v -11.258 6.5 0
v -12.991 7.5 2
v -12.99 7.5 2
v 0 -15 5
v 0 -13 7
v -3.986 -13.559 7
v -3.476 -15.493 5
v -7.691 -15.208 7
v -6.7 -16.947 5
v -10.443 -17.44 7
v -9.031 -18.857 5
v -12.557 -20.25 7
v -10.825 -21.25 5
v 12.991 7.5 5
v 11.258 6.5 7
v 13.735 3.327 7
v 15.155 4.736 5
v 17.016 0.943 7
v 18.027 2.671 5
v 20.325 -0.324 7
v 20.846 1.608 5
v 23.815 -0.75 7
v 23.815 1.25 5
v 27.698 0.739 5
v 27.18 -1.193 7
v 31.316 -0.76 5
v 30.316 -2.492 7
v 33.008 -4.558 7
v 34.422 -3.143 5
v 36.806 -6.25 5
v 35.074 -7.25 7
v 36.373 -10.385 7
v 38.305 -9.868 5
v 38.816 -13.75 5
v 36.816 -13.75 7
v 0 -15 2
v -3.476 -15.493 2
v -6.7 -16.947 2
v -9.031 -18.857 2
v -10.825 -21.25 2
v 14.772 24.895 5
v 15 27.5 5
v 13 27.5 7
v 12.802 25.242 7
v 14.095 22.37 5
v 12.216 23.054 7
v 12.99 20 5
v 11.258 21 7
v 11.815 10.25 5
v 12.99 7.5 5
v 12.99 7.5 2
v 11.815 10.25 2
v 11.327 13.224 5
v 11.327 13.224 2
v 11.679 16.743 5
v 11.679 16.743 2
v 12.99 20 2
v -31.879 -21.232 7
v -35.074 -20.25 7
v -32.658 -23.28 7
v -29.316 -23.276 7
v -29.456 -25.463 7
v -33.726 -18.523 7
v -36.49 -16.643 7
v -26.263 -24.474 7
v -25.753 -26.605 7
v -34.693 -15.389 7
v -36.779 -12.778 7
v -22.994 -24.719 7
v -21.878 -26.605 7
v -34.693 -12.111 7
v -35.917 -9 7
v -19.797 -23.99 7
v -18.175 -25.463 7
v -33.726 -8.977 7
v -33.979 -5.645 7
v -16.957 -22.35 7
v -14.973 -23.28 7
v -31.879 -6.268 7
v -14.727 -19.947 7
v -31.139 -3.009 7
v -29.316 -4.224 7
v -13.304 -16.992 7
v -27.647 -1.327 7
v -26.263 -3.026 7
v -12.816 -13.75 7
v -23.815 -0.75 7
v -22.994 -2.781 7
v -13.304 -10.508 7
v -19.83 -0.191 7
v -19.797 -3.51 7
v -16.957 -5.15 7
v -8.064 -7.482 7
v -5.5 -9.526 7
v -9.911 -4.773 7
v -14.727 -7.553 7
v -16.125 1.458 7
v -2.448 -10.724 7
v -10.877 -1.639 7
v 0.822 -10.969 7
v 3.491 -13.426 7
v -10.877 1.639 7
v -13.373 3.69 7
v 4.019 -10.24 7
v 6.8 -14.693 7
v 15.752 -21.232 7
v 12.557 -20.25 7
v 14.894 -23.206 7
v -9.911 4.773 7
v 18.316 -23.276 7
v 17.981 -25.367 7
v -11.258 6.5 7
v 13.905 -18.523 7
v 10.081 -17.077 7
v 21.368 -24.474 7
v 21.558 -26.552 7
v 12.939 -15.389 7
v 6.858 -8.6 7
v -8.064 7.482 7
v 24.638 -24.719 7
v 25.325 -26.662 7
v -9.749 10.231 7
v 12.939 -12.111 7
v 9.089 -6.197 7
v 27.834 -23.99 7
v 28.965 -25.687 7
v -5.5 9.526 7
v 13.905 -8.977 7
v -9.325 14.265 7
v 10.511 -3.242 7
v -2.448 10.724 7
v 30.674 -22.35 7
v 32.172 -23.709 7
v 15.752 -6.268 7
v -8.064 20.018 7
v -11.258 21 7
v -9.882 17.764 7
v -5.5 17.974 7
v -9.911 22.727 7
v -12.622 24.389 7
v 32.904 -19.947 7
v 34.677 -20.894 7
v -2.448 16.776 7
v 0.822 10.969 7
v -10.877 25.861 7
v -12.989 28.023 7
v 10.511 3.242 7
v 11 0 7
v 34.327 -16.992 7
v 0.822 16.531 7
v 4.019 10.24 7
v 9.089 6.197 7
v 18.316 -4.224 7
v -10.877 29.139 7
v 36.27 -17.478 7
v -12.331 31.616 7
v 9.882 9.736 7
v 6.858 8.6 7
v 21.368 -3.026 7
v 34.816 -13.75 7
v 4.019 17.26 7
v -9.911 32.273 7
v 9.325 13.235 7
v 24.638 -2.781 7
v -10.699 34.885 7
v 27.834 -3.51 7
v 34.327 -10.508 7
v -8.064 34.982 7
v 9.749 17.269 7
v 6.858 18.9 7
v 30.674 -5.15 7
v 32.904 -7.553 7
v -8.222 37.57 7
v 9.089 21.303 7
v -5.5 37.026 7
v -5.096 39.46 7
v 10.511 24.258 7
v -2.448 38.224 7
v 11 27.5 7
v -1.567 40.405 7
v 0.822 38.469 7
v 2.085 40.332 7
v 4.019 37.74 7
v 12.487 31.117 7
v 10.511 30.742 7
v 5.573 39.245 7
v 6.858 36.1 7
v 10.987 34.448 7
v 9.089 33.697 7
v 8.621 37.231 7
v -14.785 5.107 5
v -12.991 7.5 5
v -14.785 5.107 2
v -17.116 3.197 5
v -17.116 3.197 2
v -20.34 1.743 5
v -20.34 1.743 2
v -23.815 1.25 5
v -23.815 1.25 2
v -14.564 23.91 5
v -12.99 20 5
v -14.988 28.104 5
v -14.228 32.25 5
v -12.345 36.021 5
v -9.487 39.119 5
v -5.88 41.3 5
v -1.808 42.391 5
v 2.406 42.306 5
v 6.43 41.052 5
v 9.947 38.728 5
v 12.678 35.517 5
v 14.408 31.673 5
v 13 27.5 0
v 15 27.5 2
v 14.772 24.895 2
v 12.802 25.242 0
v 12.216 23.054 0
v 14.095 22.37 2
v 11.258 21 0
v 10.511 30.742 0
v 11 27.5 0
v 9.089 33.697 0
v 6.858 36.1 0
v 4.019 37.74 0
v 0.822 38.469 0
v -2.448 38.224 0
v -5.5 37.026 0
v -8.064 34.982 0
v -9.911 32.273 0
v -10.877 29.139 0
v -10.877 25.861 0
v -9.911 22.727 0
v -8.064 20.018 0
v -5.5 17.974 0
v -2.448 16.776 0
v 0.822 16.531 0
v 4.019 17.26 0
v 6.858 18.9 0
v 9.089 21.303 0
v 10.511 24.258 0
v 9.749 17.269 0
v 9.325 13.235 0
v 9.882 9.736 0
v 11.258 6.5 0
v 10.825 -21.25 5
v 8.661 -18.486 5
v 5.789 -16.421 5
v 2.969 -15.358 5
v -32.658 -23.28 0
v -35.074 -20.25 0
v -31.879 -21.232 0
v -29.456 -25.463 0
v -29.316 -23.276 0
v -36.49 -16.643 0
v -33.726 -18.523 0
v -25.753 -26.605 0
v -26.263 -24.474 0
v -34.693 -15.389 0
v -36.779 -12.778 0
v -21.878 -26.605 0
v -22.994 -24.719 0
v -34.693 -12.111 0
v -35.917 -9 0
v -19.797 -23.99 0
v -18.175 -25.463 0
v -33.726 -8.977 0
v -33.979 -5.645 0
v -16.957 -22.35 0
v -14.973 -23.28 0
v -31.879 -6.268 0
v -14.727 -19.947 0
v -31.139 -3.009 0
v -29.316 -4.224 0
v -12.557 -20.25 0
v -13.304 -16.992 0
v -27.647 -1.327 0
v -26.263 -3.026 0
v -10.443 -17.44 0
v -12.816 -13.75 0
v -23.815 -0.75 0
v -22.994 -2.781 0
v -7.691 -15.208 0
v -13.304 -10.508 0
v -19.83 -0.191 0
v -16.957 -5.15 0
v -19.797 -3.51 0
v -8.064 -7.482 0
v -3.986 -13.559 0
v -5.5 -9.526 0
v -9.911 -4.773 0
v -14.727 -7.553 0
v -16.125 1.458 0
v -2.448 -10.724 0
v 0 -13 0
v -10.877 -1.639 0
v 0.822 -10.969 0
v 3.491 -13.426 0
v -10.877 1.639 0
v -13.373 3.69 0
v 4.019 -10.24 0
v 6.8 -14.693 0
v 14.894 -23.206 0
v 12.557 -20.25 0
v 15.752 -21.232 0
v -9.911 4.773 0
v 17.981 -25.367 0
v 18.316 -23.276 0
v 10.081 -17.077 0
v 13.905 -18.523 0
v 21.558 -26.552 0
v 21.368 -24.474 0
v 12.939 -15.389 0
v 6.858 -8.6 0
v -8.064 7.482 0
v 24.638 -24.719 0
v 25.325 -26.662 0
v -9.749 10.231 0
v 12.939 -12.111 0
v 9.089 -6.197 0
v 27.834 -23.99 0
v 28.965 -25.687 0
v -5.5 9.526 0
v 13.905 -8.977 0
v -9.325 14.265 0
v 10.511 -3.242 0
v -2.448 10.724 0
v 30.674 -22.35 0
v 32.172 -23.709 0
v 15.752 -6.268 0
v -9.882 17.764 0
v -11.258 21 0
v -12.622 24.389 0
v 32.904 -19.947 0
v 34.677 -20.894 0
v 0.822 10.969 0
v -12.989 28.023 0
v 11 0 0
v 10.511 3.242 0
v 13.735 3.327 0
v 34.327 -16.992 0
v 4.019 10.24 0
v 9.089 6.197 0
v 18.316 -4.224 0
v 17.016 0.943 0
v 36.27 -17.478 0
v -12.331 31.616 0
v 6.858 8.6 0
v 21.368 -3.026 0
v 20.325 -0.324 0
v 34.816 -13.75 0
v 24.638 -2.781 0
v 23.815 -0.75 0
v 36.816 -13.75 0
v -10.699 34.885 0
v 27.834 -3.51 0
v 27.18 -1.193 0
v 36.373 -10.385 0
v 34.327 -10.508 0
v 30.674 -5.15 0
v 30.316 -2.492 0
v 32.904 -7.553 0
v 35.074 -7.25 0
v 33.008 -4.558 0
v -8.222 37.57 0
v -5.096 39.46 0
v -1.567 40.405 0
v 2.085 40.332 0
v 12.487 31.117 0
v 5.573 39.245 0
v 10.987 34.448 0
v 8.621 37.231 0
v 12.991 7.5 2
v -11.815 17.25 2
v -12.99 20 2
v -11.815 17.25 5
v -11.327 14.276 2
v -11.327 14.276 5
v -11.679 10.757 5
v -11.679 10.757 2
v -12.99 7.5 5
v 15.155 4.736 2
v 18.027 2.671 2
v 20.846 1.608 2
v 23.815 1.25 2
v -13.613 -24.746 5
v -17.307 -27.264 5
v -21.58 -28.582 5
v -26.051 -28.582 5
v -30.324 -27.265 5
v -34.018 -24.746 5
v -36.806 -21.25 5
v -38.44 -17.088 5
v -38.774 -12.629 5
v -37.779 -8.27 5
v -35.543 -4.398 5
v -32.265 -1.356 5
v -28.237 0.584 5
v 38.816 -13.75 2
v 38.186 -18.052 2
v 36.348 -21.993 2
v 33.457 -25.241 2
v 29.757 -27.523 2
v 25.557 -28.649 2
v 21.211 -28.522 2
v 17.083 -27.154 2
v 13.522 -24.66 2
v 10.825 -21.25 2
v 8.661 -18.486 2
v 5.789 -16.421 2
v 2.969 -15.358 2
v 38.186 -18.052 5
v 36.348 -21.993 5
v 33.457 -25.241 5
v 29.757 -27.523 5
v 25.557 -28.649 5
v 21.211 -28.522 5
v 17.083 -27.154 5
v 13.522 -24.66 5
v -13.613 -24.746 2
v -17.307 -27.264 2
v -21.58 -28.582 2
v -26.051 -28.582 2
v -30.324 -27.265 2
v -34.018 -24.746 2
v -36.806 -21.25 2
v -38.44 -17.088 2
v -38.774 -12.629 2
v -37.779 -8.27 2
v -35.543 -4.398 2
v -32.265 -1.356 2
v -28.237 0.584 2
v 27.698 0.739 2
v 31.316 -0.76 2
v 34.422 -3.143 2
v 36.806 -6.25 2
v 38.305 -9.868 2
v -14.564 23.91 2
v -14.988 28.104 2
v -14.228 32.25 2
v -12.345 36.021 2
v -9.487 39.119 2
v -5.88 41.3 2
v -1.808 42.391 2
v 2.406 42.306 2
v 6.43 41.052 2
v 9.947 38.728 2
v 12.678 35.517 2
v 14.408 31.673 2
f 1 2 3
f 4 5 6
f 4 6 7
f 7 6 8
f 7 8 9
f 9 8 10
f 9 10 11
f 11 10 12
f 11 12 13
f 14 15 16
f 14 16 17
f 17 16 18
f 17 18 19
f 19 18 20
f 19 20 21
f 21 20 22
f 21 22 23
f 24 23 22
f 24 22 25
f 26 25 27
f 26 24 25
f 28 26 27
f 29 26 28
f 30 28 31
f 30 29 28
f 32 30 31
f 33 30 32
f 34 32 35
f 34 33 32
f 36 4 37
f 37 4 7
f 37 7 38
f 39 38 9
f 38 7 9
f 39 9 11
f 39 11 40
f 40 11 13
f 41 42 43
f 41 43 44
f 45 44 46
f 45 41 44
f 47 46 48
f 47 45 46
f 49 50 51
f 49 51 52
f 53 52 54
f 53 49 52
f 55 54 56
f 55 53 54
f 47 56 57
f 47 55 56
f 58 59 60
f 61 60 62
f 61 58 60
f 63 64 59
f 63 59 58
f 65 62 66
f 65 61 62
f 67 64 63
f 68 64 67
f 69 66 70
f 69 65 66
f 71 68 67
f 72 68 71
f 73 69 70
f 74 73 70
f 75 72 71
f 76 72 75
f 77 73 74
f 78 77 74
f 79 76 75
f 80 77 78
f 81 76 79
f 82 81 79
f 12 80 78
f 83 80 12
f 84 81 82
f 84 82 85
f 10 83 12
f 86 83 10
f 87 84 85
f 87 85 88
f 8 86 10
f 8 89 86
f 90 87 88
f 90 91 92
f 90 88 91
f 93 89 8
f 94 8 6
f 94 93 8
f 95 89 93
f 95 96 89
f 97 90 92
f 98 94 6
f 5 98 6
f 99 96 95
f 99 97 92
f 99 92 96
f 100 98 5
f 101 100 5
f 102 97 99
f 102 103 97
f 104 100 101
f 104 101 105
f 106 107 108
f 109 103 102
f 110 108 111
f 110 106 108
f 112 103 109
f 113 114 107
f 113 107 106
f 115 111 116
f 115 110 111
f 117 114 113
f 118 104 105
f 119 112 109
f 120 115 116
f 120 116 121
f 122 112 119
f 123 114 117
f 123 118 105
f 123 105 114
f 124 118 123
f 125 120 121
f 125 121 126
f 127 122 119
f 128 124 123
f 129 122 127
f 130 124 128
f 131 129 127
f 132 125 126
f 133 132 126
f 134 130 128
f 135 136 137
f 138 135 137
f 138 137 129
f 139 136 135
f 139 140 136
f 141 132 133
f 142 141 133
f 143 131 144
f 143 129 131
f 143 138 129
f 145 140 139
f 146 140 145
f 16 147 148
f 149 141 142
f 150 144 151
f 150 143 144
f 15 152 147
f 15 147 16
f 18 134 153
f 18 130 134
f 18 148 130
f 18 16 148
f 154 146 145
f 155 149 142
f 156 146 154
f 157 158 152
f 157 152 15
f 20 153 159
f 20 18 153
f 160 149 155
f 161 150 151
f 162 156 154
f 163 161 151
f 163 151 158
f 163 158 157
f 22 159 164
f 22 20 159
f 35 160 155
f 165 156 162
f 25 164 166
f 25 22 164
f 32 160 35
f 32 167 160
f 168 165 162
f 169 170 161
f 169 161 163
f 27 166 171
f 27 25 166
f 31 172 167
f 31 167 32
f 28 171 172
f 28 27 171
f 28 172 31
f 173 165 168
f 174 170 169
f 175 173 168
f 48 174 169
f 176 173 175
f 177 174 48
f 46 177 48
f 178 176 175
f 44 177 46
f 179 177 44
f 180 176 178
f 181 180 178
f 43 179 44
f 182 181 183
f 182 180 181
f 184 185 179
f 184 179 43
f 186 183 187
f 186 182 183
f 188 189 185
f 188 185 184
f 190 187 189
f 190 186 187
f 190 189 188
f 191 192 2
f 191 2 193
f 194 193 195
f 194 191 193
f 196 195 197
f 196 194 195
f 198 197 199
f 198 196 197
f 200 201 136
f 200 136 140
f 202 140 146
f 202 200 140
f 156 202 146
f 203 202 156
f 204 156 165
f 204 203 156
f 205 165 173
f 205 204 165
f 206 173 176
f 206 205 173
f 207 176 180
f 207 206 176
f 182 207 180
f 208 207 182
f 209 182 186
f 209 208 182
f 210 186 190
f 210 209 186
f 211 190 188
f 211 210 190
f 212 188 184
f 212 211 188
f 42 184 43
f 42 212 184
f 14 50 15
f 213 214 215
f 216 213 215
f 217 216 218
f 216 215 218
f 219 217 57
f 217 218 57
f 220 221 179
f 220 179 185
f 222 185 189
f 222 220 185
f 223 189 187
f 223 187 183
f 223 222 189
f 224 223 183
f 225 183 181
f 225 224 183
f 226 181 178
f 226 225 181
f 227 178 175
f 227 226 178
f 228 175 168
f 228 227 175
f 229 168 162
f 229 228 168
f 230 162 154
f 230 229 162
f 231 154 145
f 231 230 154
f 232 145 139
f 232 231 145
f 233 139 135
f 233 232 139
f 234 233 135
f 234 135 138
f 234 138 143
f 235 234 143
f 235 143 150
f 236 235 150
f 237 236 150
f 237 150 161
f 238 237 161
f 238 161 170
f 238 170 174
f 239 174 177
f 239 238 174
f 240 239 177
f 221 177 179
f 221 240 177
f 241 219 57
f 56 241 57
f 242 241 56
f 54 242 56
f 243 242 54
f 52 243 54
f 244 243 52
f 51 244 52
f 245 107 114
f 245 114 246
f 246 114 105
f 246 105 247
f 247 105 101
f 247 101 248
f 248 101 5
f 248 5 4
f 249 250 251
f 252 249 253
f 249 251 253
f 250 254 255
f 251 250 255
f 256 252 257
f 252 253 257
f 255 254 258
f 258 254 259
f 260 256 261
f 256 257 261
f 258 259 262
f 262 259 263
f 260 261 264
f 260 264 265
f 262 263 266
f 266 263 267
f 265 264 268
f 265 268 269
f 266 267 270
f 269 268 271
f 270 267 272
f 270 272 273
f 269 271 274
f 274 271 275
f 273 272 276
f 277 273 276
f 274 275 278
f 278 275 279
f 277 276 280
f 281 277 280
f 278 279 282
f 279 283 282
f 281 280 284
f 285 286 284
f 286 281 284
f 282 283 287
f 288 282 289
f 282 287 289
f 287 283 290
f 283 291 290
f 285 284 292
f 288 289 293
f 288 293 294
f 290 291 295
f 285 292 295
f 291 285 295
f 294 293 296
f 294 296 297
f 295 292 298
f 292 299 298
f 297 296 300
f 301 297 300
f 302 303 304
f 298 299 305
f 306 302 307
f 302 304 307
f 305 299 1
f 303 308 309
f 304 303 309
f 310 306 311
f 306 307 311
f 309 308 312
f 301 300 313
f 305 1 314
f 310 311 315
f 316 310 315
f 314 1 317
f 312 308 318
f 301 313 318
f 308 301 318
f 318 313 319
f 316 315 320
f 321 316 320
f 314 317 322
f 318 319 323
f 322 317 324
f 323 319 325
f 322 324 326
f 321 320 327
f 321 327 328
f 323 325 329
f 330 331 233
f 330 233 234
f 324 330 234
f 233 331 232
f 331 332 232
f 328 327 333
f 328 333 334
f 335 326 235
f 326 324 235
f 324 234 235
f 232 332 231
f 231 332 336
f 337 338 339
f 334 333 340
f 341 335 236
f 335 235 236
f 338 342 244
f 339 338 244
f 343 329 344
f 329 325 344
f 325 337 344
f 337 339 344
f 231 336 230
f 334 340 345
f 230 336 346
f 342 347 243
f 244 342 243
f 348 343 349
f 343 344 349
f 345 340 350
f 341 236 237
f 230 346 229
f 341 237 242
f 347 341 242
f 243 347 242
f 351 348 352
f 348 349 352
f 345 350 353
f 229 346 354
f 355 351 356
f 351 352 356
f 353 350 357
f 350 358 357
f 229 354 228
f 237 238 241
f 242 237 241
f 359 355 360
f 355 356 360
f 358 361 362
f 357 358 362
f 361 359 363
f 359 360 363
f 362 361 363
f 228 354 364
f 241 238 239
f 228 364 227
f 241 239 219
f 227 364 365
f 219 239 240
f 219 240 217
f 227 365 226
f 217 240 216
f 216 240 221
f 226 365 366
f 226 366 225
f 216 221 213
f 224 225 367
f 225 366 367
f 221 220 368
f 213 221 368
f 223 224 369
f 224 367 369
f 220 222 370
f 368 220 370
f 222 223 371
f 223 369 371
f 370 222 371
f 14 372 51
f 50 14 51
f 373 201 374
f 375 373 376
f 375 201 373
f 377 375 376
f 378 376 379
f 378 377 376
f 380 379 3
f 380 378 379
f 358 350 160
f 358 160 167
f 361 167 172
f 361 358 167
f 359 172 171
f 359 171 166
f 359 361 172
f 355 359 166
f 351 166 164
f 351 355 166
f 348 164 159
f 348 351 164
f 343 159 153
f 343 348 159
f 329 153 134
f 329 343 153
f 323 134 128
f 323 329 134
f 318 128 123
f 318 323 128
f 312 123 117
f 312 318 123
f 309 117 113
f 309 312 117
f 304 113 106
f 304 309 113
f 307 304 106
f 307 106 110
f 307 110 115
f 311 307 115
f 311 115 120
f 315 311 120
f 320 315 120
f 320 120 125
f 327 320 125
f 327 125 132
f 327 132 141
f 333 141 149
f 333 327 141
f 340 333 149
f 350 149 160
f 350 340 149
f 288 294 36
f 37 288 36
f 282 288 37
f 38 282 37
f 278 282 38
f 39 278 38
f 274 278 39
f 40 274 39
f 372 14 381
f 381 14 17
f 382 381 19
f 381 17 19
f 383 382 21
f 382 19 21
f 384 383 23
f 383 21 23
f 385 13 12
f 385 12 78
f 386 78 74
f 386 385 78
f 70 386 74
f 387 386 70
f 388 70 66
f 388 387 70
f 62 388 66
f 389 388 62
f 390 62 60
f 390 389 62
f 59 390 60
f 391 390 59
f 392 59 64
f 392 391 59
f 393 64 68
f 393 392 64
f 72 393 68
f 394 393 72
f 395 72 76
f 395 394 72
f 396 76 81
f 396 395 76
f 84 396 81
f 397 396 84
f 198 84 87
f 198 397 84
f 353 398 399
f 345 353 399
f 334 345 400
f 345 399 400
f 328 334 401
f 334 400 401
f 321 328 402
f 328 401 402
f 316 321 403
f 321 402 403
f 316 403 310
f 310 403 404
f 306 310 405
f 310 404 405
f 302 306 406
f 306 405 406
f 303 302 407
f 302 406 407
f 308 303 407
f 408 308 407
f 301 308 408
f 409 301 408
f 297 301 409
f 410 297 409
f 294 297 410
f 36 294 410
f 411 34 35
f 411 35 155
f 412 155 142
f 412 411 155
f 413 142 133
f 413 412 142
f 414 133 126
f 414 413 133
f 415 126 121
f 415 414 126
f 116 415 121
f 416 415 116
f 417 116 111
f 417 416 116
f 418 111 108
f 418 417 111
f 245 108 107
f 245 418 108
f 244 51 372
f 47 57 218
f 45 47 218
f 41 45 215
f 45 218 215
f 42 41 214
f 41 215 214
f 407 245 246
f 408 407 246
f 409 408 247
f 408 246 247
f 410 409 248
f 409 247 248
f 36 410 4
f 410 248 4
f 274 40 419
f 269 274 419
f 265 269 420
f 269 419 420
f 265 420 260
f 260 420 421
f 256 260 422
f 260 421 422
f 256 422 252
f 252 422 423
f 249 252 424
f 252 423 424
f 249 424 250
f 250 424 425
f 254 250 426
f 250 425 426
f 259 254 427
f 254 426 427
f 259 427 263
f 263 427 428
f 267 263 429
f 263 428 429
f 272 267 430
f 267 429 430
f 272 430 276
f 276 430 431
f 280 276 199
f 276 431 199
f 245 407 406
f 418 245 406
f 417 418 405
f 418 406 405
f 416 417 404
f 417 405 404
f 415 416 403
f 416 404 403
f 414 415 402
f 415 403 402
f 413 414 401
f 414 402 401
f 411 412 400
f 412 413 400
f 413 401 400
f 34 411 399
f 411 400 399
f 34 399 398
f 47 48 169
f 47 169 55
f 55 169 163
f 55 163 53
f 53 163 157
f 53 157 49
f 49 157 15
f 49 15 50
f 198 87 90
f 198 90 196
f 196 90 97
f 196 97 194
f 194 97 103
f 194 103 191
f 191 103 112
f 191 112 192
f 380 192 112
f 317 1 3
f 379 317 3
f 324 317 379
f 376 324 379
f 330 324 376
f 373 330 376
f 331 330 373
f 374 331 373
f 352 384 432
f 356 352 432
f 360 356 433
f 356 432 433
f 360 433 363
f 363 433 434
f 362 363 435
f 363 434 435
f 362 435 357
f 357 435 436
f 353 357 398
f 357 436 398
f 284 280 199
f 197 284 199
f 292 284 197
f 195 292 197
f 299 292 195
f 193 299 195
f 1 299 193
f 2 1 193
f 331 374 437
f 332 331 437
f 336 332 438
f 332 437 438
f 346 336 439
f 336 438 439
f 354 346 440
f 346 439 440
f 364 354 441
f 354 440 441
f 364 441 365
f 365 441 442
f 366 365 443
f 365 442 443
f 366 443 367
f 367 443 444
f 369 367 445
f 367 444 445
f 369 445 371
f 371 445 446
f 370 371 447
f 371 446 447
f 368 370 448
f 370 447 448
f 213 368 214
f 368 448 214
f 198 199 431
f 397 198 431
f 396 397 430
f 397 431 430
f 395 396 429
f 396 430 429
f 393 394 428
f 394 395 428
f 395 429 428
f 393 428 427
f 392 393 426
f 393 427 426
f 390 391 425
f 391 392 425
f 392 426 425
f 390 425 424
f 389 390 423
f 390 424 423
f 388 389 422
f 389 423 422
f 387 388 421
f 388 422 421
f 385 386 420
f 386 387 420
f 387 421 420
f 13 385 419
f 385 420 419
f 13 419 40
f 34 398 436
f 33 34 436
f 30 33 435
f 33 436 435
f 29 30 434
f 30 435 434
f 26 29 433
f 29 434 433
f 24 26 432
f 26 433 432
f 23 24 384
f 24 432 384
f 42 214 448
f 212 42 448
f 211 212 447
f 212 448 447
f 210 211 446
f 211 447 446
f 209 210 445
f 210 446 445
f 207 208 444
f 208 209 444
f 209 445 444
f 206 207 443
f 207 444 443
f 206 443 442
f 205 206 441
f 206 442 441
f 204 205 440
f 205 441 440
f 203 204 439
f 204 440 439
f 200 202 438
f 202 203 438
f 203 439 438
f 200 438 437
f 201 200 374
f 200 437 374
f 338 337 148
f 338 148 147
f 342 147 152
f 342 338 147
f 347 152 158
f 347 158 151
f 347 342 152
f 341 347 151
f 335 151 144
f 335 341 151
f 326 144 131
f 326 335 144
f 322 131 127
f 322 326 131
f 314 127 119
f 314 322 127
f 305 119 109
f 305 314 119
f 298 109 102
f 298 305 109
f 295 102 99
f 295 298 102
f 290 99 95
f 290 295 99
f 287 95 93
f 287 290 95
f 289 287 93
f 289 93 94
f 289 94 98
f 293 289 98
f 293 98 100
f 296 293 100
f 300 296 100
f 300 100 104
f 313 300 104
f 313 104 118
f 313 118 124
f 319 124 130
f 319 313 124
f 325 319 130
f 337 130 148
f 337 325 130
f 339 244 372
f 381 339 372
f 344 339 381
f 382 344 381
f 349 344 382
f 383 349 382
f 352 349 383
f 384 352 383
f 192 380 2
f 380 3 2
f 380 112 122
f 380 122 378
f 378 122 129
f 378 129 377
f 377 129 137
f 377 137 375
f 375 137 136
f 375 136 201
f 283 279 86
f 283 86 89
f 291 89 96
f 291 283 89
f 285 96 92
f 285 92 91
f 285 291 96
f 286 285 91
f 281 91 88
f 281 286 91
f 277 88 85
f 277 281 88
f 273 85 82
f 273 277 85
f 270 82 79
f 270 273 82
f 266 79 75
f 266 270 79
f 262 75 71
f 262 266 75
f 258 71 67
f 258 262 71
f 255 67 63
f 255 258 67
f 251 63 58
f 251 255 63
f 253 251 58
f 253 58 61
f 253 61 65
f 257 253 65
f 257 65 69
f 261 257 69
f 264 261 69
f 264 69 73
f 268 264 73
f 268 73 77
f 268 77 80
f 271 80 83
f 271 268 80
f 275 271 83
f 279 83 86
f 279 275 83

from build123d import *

# Parameters (mm, degrees)
F0_R     = 11
F1_DEPTH = 7
F2_R     = 12.499
F3_SIZE  = 2


# Not quite as in the source:
# - a fillet or chamfer is up to 0.001 mm smaller than in the source, because OpenCascade refuses the exact size


with BuildPart() as f1:
    # F0 (on Top) → F1 (new body)
    with BuildSketch(Plane.XY):
        with BuildLine():
            ThreePointArc((14.9052440041, -1.6833600857), (14.9762922658, -0.8430124372), (15, 0))
            ThreePointArc((15, 0), (12.5483433381, 8.2182163192), (5.9947894041, 13.75))
            ThreePointArc((5.9947894041, 13.75), (0, 12.5), (-5.9947894041, 13.75))
            ThreePointArc((-5.9947894041, 13.75), (-12.9903810568, 7.5), (-14.9052440041, -1.6833600857))
            ThreePointArc((-14.9052440041, -1.6833600857), (-10.8253175473, -6.25), (-8.9104546, -12.0666399143))
            ThreePointArc((-8.9104546, -12.0666399143), (0, -15), (8.9104546, -12.0666399143))
            ThreePointArc((8.9104546, -12.0666399143), (10.8253175473, -6.25), (14.9052440041, -1.6833600857))
        make_face()
        Circle(F0_R, mode=Mode.SUBTRACT)
        with BuildLine():
            ThreePointArc((-5.9947894041, 13.75), (0, 12.5), (5.9947894041, 13.75))
            ThreePointArc((5.9947894041, 13.75), (0, 15), (-5.9947894041, 13.75))
        make_face()
        with BuildLine():
            ThreePointArc((-5.9947894041, 13.75), (0, 15), (5.9947894041, 13.75))
            ThreePointArc((5.9947894041, 13.75), (12.5483433381, 19.2817836808), (15, 27.5))
            ThreePointArc((15, 27.5), (-8.2182163192, 40.0483433381), (-5.9947894041, 13.75))
        make_face()
        with Locations((0, 27.5)):
            Circle(F0_R, mode=Mode.SUBTRACT)
        with BuildLine():
            ThreePointArc((38.8156986041, -13.75), (30.5737745507, -0.3586442247), (14.9052440041, -1.6833600857))
            ThreePointArc((14.9052440041, -1.6833600857), (12.9903810568, -7.5), (8.9104546, -12.0666399143))
            ThreePointArc((8.9104546, -12.0666399143), (22.9726861669, -28.7262922658), (38.8156986041, -13.75))
        make_face()
        with Locations((23.8156986041, -13.75)):
            Circle(F0_R, mode=Mode.SUBTRACT)
        with BuildLine():
            ThreePointArc((8.9104546, -12.0666399143), (12.9903810568, -7.5), (14.9052440041, -1.6833600857))
            ThreePointArc((14.9052440041, -1.6833600857), (10.8253175473, -6.25), (8.9104546, -12.0666399143))
        make_face()
        with BuildLine():
            ThreePointArc((-8.9104546, -12.0666399143), (-10.8253175473, -6.25), (-14.9052440041, -1.6833600857))
            ThreePointArc((-14.9052440041, -1.6833600857), (-12.9903810568, -7.5), (-8.9104546, -12.0666399143))
        make_face()
        with BuildLine():
            ThreePointArc((-8.9104546, -12.0666399143), (-12.9903810568, -7.5), (-14.9052440041, -1.6833600857))
            ThreePointArc((-14.9052440041, -1.6833600857), (-37.2070543793, -20.5080759466), (-8.8156986041, -13.75))
            ThreePointArc((-8.8156986041, -13.75), (-8.8394063383, -12.9069875628), (-8.9104546, -12.0666399143))
        make_face()
        with Locations((-23.8156986041, -13.75)):
            Circle(F0_R, mode=Mode.SUBTRACT)
    extrude(amount=F1_DEPTH)

    # F2 (radius 12.5 in the source; OpenCascade refuses exactly that, so slightly less here)
    f2_edges = [f1.edges().sort_by_distance(p)[0] for p in [
        (-5.994789, 13.75, 3.5),
        (14.905244, -1.68336, 3.5),
        (-14.905244, -1.68336, 3.5),
        (5.994789, 13.75, 3.5),
        (-8.910455, -12.06664, 3.5),
        (8.910455, -12.06664, 3.5),
    ]]
    fillet(f2_edges, radius=F2_R)

    # F3
    f3_edges = [f1.edges().sort_by_distance(p)[0] for p in [
        (-6.250077, -16.674548, 0),
        (-6.250077, -16.674548, 7),
    ]]
    chamfer(f3_edges, length=F3_SIZE)


solid = f1.part
